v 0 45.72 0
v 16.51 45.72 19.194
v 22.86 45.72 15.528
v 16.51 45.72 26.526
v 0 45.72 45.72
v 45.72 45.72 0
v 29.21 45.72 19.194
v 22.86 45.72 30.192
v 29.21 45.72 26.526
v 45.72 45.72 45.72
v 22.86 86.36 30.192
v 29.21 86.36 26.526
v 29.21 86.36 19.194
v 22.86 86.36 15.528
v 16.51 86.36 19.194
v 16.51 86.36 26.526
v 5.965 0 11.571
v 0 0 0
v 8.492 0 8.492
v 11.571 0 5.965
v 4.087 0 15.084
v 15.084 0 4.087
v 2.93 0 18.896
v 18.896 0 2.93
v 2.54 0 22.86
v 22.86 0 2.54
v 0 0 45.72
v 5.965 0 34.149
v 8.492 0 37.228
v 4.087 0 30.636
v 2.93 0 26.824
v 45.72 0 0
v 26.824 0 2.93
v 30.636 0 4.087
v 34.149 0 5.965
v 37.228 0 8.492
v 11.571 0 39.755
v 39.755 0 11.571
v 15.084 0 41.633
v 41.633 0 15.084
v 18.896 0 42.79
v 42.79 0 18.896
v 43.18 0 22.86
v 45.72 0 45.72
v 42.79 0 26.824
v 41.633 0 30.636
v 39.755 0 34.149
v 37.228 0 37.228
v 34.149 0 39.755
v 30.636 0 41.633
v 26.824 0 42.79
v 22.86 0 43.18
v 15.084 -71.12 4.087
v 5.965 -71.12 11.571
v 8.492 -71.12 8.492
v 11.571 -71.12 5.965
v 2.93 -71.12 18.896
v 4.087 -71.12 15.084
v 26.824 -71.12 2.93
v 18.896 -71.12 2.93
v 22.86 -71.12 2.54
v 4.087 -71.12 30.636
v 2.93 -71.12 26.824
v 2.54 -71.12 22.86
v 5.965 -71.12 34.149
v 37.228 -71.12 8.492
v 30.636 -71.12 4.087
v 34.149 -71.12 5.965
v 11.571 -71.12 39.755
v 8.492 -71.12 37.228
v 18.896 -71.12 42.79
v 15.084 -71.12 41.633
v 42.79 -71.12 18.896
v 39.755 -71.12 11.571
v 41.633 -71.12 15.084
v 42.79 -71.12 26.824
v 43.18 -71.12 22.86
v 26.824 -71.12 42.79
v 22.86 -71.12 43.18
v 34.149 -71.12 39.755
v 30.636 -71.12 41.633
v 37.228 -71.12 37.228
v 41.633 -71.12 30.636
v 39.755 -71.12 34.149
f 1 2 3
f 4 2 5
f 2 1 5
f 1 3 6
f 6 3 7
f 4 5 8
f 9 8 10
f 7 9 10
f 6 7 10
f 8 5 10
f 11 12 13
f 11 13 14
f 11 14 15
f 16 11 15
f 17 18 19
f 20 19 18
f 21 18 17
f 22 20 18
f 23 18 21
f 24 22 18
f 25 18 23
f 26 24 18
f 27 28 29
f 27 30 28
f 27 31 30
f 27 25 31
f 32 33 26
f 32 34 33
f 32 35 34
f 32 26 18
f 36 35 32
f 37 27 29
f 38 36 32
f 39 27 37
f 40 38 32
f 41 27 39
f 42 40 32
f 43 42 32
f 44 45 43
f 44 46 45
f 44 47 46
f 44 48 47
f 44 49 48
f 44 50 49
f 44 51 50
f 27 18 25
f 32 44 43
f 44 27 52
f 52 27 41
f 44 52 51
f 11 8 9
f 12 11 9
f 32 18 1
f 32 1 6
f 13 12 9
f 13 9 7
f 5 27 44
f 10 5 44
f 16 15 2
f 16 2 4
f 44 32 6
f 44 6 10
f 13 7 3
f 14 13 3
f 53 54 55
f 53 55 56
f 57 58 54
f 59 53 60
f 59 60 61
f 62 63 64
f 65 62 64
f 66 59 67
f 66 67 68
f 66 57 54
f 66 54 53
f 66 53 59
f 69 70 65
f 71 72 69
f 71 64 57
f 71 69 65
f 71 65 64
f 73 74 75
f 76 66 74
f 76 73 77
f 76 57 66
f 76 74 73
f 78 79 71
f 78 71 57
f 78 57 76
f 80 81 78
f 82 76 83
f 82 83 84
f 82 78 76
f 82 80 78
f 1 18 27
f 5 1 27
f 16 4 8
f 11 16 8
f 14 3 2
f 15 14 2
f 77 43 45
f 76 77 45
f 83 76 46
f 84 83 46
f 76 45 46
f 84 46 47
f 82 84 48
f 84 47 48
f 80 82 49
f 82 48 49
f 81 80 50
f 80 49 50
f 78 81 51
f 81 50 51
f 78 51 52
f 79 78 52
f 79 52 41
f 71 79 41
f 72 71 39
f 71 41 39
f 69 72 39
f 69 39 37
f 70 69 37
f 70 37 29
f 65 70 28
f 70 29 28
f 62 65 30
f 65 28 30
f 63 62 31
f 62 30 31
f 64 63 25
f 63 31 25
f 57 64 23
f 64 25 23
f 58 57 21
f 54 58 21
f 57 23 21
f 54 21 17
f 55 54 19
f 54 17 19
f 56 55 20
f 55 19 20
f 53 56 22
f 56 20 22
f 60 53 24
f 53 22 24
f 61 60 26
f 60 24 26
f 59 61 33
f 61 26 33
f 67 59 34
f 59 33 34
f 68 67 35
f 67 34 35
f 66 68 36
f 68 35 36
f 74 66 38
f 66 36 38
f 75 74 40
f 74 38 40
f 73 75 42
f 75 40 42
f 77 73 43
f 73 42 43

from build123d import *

# Parameters (mm, degrees)
F0_W     = 45.72
F0_H     = 45.72
F0_R     = 20.32
F1_DEPTH = 45.72
F2_DEPTH = 71.12
F4_DEPTH = 40.64


with BuildPart() as f1:
    # F0 (on Front) → F1 (new body)
    with BuildSketch(Plane.XZ):
        with Locations((22.86, 22.86)):
            Rectangle(F0_W, F0_H)
        with Locations((22.86, 22.86)):
            Circle(F0_R, mode=Mode.SUBTRACT)
        with Locations((22.86, 22.86)):
            Circle(F0_R)
    extrude(amount=-F1_DEPTH)

    # F0 (on Front) → F2 (join)
    with BuildSketch(Plane.XZ):
        with Locations((22.86, 22.86)):
            Circle(F0_R)
    extrude(amount=F2_DEPTH)

    # F3 (on face) → F4 (join)
    with BuildSketch(Plane(origin=(0, 45.72, 0), x_dir=(-1, 0, 0), z_dir=(0, 1, 0))):
        Polygon((-16.51, 19.193826), (-16.51, 26.526174), (-22.86, 30.192348), (-29.21, 26.526174), (-29.21, 19.193826), (-22.86, 15.527652), align=None)
    extrude(amount=F4_DEPTH)


solid = f1.part
